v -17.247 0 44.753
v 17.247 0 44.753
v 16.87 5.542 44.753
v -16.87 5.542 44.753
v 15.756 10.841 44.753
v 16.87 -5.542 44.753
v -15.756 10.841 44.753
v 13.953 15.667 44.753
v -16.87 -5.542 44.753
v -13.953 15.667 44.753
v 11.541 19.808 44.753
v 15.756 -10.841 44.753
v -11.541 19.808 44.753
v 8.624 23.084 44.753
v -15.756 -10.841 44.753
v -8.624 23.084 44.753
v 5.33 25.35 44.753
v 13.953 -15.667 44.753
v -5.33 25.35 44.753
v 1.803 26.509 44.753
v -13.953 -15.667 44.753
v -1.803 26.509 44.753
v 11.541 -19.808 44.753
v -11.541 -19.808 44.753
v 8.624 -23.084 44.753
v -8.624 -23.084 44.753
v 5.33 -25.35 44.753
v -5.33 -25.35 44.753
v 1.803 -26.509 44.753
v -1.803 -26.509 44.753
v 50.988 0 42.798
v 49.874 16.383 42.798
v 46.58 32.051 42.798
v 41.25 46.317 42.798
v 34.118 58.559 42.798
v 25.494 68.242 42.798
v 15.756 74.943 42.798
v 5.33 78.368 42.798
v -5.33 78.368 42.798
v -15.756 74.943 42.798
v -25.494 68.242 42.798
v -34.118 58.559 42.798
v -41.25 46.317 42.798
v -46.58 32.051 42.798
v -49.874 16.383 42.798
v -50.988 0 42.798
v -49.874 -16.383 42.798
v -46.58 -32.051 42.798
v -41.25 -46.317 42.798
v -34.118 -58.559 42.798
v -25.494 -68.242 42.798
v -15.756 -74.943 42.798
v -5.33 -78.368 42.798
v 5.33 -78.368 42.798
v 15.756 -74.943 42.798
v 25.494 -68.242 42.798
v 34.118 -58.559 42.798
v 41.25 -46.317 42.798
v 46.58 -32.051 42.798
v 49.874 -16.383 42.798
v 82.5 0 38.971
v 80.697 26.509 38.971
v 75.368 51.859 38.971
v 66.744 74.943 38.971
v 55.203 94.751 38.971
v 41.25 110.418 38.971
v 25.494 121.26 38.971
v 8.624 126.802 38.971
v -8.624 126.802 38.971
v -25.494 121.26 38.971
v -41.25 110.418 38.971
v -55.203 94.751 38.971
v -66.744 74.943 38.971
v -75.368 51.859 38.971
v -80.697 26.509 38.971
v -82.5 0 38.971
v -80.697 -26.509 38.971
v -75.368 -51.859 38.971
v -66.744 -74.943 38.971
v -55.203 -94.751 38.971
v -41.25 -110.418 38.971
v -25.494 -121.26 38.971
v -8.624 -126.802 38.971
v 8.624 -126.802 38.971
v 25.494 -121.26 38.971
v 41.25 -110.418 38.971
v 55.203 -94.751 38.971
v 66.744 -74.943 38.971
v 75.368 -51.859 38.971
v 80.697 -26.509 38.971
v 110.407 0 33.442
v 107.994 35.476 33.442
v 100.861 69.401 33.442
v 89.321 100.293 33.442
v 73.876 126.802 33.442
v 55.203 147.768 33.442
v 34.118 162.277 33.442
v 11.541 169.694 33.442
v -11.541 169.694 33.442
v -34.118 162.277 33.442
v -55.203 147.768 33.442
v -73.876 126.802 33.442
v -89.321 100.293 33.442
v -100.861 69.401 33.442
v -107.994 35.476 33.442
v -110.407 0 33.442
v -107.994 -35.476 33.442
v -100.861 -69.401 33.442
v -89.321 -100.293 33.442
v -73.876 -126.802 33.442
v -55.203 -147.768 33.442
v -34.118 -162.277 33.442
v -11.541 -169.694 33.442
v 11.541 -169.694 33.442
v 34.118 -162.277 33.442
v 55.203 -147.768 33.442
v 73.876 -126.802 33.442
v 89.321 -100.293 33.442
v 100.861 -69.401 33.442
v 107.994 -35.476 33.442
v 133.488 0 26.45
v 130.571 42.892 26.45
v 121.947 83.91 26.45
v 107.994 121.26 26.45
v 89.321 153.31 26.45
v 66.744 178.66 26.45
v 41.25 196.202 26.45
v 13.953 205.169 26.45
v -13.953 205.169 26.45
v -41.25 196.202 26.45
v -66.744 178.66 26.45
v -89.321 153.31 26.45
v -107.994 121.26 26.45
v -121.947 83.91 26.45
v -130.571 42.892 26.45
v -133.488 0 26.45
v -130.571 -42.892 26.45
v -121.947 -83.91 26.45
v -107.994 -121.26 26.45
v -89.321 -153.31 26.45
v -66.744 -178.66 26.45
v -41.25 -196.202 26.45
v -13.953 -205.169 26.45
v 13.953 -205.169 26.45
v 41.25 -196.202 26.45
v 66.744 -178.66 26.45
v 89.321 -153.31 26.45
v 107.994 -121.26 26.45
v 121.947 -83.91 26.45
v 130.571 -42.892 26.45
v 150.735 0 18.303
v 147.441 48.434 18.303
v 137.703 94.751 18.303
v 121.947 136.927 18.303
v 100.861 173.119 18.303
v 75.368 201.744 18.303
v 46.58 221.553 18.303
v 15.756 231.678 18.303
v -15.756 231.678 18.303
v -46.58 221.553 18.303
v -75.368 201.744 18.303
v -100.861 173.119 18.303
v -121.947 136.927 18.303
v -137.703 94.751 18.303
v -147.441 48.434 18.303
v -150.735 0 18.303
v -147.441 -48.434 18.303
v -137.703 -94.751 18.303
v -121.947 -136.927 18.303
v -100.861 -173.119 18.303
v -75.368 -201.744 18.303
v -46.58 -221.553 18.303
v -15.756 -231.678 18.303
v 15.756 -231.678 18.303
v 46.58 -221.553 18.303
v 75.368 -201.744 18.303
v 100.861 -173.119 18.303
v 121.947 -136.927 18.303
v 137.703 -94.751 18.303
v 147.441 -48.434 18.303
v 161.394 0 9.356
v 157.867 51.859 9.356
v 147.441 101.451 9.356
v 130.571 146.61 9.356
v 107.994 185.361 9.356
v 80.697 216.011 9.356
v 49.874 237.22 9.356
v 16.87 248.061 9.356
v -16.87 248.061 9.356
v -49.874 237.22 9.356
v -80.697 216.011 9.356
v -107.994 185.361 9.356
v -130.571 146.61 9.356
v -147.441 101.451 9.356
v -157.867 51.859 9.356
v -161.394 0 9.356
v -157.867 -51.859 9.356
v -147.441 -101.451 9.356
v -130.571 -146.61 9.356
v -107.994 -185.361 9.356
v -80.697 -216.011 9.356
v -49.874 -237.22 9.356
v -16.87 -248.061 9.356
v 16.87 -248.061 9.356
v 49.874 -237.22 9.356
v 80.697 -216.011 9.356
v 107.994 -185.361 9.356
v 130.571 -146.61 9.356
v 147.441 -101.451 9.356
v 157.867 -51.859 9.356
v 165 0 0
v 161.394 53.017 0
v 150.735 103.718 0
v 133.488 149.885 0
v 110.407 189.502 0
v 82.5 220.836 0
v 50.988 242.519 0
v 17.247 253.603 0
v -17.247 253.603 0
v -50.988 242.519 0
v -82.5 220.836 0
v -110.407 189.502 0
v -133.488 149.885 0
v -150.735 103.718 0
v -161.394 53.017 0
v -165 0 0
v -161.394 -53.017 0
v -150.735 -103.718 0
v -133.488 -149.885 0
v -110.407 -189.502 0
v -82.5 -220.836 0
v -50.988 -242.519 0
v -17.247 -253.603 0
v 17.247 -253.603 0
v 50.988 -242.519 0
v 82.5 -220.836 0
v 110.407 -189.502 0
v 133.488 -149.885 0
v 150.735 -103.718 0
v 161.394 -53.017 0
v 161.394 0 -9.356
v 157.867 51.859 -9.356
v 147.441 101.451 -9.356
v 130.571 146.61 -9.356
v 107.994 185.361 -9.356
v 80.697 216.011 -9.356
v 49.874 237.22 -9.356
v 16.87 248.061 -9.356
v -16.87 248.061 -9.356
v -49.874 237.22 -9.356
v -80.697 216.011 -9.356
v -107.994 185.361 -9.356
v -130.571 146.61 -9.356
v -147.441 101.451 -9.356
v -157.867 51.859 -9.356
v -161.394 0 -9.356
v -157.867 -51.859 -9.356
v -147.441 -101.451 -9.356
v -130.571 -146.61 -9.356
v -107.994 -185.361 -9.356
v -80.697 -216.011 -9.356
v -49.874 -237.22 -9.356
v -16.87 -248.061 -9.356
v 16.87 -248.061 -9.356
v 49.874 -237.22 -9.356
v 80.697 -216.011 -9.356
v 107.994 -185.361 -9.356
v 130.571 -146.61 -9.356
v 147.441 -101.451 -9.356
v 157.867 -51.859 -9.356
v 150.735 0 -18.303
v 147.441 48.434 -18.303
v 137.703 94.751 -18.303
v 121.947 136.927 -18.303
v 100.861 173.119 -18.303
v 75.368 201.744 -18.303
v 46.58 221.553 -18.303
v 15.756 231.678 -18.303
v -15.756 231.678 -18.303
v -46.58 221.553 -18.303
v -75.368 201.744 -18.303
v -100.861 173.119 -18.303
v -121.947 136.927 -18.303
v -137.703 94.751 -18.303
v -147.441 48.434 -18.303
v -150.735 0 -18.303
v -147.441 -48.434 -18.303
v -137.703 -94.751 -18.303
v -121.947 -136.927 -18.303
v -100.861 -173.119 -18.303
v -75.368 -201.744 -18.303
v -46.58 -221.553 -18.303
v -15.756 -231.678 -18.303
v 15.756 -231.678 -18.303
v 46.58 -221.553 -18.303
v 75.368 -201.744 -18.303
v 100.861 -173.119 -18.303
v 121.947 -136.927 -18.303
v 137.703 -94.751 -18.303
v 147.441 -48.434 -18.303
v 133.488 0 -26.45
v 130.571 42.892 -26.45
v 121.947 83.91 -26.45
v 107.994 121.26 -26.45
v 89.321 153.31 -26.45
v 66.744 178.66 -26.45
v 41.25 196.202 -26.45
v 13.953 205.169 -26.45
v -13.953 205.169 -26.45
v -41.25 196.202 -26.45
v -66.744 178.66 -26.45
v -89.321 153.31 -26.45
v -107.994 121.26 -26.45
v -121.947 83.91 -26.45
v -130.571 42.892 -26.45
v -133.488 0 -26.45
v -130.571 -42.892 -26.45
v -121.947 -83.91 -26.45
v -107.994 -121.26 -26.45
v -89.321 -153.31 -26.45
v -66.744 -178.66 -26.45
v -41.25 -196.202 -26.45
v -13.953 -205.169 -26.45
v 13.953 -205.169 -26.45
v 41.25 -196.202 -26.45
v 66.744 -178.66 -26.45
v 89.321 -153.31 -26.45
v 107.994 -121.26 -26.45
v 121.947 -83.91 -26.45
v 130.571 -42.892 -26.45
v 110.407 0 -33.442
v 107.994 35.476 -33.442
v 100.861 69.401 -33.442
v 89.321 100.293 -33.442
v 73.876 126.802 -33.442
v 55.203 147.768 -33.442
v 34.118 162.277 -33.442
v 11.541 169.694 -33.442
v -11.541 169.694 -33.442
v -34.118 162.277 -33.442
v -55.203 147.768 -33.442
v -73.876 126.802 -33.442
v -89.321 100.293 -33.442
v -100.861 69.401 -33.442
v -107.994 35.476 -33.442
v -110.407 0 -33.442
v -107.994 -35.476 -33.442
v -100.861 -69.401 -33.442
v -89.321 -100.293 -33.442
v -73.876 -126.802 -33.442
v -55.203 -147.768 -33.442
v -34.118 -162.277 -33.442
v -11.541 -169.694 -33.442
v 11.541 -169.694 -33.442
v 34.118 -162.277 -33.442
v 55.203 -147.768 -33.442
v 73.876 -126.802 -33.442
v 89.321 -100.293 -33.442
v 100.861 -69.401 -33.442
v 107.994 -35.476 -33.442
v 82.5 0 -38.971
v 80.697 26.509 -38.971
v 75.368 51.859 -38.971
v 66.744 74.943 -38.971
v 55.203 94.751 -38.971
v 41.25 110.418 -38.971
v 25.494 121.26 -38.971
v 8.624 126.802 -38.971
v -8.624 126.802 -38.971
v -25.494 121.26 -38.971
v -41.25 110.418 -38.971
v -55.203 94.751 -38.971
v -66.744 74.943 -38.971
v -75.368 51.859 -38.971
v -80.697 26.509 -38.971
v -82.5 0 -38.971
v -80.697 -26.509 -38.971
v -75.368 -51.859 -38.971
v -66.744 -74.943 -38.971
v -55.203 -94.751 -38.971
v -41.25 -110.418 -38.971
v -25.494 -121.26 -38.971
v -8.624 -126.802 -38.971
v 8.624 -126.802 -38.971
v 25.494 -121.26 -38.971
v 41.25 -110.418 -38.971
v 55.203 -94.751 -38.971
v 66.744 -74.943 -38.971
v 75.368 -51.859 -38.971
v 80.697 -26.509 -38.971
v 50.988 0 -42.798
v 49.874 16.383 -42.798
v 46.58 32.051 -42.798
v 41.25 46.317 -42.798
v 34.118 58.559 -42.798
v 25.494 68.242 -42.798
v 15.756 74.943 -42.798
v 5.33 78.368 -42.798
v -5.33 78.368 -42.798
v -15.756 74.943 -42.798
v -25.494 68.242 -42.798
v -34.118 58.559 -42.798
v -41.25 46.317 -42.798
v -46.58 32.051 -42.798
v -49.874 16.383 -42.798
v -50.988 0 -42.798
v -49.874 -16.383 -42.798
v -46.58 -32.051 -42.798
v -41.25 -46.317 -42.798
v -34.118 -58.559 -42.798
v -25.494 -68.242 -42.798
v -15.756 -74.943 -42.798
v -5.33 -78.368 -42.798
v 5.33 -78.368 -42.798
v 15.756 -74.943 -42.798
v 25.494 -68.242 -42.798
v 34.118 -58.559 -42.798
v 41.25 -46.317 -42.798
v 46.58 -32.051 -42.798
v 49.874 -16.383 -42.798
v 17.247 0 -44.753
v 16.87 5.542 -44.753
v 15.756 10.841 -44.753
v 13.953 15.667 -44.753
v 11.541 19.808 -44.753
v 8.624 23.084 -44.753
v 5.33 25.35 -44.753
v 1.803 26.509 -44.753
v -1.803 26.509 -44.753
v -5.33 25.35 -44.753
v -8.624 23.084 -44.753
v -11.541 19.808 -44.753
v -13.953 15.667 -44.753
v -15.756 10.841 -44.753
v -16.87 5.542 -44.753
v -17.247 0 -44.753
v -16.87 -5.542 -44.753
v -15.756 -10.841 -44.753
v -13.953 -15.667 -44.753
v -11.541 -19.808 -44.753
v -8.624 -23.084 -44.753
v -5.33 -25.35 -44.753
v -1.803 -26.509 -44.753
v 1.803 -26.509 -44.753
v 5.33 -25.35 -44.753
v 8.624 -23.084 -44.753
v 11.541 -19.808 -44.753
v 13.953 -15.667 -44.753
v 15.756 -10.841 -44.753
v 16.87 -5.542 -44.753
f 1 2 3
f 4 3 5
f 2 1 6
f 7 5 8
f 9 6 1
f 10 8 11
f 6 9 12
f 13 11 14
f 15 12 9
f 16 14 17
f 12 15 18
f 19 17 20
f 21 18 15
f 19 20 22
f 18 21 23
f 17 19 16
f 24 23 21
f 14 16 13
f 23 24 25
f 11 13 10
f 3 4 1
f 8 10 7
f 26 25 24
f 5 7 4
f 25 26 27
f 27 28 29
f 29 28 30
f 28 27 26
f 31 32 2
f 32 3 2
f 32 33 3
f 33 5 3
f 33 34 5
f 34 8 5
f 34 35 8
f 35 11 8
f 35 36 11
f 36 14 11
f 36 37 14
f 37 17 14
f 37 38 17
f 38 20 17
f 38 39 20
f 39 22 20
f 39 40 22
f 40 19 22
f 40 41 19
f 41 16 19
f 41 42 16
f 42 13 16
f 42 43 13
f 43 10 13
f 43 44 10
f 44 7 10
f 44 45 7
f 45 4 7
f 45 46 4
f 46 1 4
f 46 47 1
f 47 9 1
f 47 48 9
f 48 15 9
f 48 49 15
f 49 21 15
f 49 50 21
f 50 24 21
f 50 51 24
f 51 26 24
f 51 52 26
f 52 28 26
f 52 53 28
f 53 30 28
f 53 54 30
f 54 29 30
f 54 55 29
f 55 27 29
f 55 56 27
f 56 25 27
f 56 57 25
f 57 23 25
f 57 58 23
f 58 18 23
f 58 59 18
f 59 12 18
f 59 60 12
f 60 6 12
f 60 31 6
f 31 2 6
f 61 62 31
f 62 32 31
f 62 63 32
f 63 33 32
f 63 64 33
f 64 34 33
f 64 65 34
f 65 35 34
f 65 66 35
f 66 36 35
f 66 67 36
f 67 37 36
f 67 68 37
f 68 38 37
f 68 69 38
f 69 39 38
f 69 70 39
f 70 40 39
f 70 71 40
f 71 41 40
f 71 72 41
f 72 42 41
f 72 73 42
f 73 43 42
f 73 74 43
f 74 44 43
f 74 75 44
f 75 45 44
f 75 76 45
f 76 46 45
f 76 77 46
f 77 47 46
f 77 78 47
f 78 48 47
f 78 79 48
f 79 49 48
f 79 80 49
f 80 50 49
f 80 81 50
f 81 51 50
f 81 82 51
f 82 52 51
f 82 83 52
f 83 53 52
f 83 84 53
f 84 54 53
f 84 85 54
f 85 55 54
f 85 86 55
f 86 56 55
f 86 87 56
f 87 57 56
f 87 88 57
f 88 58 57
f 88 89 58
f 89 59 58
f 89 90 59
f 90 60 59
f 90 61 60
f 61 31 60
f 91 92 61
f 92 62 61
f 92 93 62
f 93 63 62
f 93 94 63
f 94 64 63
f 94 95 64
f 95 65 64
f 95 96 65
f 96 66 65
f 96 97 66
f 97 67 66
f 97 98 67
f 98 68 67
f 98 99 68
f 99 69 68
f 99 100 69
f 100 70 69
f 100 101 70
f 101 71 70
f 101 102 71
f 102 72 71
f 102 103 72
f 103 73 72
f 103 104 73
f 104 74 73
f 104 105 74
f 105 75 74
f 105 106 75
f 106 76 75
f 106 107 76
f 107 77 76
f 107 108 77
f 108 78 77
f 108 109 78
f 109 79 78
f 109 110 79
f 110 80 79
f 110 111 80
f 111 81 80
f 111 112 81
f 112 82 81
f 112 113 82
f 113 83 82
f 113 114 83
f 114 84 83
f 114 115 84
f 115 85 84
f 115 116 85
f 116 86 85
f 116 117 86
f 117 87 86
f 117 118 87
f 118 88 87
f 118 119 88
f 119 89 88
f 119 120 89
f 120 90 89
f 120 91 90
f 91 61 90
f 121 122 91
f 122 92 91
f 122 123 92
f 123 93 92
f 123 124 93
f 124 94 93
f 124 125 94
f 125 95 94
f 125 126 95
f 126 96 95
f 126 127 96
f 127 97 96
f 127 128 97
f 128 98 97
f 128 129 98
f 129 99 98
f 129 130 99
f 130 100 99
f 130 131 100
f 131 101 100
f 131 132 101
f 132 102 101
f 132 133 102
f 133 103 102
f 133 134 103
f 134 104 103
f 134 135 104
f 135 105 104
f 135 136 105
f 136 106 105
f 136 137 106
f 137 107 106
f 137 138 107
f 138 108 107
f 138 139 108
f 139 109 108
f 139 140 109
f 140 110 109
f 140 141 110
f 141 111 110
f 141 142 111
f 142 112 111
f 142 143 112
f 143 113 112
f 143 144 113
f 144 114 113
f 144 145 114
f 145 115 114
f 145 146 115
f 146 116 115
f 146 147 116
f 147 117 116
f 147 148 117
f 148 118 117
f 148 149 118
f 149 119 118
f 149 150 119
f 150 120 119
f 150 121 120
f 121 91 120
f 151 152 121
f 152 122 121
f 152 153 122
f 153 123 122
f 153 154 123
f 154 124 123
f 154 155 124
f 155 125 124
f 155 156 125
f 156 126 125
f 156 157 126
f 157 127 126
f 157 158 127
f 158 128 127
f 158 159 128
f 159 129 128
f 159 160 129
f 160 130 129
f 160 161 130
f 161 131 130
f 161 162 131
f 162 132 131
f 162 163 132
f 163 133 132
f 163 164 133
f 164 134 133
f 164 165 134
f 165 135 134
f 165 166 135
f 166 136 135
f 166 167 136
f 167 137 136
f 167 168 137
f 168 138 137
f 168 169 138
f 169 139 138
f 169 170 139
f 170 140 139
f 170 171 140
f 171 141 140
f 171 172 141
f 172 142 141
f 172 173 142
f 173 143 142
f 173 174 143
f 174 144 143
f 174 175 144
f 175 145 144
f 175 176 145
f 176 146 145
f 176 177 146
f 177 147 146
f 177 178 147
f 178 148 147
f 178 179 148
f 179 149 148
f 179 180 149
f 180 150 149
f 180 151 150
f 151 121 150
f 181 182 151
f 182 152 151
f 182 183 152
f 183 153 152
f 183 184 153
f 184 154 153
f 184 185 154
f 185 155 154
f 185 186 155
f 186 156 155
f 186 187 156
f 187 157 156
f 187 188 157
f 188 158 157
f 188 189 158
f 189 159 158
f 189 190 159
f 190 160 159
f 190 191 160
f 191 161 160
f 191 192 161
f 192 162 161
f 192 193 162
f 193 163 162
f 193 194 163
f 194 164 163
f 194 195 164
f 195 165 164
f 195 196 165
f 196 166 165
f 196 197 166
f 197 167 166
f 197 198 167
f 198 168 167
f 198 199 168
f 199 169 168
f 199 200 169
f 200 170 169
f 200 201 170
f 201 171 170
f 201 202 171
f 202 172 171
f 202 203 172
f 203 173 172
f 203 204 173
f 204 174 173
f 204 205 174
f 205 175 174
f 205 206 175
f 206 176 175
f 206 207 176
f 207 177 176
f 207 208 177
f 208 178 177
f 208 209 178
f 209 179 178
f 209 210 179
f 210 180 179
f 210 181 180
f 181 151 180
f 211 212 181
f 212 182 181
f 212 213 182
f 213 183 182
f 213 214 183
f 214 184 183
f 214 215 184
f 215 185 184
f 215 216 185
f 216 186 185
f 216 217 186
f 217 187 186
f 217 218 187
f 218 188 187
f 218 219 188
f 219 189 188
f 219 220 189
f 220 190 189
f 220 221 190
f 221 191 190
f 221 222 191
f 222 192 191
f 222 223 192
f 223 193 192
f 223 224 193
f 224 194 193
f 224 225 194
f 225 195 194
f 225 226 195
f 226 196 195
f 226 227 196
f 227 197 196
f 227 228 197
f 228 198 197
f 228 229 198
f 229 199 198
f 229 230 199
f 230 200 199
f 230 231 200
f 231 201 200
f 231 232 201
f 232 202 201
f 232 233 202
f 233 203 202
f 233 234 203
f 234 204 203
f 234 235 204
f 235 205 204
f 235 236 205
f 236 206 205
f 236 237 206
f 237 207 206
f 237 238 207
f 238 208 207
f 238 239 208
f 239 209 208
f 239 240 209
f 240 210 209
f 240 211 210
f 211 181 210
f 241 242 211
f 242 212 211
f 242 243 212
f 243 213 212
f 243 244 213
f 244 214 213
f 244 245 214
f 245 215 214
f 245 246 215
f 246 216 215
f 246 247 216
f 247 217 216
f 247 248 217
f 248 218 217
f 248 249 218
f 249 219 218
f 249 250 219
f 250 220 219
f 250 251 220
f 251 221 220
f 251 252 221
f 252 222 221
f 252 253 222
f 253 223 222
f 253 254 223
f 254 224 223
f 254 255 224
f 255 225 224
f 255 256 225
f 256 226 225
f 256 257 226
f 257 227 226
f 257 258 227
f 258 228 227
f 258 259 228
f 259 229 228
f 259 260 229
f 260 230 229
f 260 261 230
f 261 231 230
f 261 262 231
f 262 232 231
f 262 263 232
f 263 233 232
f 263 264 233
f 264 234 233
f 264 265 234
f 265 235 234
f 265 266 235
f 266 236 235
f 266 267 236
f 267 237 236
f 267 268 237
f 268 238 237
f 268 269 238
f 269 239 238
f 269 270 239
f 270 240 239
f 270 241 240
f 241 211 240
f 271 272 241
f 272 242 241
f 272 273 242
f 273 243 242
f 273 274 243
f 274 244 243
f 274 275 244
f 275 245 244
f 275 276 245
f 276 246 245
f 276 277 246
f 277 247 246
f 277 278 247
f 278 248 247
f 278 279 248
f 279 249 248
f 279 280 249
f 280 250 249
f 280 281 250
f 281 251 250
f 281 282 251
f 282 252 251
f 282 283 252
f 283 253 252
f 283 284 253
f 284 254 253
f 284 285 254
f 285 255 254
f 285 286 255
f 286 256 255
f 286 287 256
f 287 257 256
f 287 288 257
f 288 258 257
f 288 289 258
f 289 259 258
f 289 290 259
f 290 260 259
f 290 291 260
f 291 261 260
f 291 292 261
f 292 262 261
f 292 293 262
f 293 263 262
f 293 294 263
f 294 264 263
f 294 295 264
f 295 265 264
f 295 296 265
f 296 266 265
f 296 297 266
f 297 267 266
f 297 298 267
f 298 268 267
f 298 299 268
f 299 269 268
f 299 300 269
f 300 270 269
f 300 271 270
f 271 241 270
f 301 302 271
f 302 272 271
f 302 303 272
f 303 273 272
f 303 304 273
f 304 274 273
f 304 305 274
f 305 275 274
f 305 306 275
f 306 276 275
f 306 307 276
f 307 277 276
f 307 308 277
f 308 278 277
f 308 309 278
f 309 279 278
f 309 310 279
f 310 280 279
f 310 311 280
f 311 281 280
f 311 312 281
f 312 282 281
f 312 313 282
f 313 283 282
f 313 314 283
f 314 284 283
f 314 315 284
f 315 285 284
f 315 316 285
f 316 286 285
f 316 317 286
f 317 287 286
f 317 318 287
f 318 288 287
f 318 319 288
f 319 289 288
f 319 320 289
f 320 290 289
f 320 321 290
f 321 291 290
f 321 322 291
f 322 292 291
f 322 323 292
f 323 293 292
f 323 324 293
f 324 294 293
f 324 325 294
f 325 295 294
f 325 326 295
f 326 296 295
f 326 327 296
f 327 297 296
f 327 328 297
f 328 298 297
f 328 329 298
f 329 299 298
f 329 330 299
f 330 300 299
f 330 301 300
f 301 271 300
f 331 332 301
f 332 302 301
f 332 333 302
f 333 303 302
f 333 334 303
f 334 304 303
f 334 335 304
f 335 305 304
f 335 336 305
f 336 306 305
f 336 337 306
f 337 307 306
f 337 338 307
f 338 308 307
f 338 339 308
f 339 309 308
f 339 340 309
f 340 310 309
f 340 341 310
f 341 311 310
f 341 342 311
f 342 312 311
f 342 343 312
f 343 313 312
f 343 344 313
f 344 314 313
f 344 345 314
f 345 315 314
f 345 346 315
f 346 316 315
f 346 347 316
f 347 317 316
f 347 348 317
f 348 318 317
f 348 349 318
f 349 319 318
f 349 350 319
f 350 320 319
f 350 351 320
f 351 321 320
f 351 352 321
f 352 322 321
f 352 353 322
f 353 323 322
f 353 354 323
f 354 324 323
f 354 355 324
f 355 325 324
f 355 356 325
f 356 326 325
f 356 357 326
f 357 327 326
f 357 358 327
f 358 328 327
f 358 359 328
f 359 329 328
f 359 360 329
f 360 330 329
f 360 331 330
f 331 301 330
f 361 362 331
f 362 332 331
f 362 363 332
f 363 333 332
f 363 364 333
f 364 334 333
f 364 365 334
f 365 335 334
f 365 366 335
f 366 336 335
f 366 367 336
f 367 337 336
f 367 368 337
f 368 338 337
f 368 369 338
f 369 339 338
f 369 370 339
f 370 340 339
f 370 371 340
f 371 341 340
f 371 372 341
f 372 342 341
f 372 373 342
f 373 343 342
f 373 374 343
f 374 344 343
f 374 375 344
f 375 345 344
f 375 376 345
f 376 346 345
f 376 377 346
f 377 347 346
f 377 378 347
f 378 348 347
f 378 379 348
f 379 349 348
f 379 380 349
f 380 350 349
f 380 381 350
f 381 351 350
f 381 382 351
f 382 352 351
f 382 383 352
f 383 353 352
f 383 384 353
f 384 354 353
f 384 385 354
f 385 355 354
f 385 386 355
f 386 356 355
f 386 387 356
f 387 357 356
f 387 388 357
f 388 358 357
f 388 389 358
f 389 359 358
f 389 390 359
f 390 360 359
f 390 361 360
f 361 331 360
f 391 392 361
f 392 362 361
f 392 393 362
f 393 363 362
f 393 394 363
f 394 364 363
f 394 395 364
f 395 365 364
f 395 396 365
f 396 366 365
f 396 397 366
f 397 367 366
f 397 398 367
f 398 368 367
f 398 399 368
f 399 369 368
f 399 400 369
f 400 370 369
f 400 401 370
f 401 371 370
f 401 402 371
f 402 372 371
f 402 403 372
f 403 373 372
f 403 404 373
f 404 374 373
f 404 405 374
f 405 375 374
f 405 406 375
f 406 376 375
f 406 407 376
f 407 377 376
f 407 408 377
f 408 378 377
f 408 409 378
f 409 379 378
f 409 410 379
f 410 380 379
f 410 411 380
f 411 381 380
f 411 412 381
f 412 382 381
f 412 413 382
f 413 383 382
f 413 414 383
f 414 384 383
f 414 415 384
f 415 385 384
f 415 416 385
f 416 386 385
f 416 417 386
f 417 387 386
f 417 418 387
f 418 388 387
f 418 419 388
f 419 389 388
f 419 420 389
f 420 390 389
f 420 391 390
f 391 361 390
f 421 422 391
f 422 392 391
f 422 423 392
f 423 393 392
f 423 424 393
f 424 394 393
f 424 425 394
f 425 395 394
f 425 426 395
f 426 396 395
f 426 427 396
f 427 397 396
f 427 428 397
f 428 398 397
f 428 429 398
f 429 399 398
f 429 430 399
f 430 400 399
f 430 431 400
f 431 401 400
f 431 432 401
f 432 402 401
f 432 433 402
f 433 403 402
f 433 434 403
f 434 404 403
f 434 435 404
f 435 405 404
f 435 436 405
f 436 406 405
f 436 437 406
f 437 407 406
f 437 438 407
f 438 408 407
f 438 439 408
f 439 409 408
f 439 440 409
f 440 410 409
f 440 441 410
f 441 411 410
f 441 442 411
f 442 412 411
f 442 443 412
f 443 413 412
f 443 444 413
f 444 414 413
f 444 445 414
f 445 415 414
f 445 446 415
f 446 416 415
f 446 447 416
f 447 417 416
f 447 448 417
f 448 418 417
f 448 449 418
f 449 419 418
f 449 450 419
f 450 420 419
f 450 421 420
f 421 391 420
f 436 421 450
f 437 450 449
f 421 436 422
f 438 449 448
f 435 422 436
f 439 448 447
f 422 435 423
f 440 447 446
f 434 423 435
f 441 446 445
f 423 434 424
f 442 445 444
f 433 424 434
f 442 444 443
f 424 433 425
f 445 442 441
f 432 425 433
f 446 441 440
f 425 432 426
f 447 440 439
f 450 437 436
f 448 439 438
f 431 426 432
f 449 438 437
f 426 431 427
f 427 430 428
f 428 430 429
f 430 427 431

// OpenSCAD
// Generated by SolidPython 1.0.1 on 2020-07-29 00:46:50


scale(v = [11, 17, 3]) {
	sphere(r = 15);
}
/***********************************************
*********      SolidPython code:      **********
************************************************
 
# import packages: SolidPython
from solid import *
from solid.utils import *
from itertools import chain, combinations, permutations


class Resize:

    def __init__(self, scad_file):
        self.scad_file = scad_file
        #self.scad_file = import_scad(scad_file)
        # cone/cylinder param:
        self.r1 = 0
        self.r2 = 0
        self.h = 0
        # rectangular prism param:
        self.w = 0
        self.l = 0
        # ellipse param:
        self.r = 0

    # import OpenScad code (file name corresponds to shape)


    # classify shape + parameters
    def assign(self, param1, param2, param3):
        if self.scad_file == 'cone.scad':
            self.r1 = param1
            self.r2 = param2
            self.h = param3
        elif self.scad_file == 'cylinder.scad':
            self.r1 = param1
            self.r2 = param2
            self.h = param3
        elif self.scad_file == 'rectangularPrism.scad':
            self.h = param1
            self.l = param2
            self.w = param3
        else:
            self.r = param1
            self.h = param2

    # resize parameters
    def iterate(self):
        x = range(3, 20, 2)
        i = 1
        if self.scad_file == 'cone.scad':
            tempList = list(permutations(x, 2))
            for temp in tempList:
                param1 = temp[0]
                param2 = temp[1]
                filepath = 'produced_scad_files/' + 'cone' + str(param1) + '_' + str(param2) + '_' + '.scad'
                scad_render_to_file(cylinder(h=param1, r1=param2, r2=0), filepath)

        elif self.scad_file == 'cylinder.scad':
            tempList = list(permutations(x, 3))
            for temp in tempList:
                param1 = temp[0]
                param2 = temp[1]
                filepath = 'produced_scad_files/' + 'cylinder' + str(param1) + '_' + str(param2) + '_' + '.scad'
                scad_render_to_file(cylinder(h=param1, r1=param2, r2=param2), filepath)

        elif self.scad_file == 'rectangularPrism.scad':
            tempList = list(permutations(x, 3))
            for temp in tempList:
                param1 = temp[0]
                param2 = temp[1]
                param3 = temp[2]
                filepath = 'produced_scad_files/' + 'rectangularPrism' + str(param1) + '_' + str(param2) + '_' + str(
                    param3) + '.scad'
                scad_render_to_file(cube(size=(param1, param2, param3)), filepath)

        elif self.scad_file == 'ellipse.scad':
            tempList = list(permutations(x, 4))
            for temp in tempList:
                param1 = temp[0]
                param2 = temp[1]
                param3 = temp[2]
                param4 = temp[3]
                filepath = 'produced_scad_files/' + 'ellipse' + str(param1) + '_' + str(param2) + '_' + str(param3) + '_' + str(param4) + '.scad'
                scad_render_to_file(scale([param1, param2, param3])(sphere(r=param4)), filepath)

    def render_to_scadfile(self):
        scad_render_to_file(scad, 'example.scad') 
 
************************************************/
